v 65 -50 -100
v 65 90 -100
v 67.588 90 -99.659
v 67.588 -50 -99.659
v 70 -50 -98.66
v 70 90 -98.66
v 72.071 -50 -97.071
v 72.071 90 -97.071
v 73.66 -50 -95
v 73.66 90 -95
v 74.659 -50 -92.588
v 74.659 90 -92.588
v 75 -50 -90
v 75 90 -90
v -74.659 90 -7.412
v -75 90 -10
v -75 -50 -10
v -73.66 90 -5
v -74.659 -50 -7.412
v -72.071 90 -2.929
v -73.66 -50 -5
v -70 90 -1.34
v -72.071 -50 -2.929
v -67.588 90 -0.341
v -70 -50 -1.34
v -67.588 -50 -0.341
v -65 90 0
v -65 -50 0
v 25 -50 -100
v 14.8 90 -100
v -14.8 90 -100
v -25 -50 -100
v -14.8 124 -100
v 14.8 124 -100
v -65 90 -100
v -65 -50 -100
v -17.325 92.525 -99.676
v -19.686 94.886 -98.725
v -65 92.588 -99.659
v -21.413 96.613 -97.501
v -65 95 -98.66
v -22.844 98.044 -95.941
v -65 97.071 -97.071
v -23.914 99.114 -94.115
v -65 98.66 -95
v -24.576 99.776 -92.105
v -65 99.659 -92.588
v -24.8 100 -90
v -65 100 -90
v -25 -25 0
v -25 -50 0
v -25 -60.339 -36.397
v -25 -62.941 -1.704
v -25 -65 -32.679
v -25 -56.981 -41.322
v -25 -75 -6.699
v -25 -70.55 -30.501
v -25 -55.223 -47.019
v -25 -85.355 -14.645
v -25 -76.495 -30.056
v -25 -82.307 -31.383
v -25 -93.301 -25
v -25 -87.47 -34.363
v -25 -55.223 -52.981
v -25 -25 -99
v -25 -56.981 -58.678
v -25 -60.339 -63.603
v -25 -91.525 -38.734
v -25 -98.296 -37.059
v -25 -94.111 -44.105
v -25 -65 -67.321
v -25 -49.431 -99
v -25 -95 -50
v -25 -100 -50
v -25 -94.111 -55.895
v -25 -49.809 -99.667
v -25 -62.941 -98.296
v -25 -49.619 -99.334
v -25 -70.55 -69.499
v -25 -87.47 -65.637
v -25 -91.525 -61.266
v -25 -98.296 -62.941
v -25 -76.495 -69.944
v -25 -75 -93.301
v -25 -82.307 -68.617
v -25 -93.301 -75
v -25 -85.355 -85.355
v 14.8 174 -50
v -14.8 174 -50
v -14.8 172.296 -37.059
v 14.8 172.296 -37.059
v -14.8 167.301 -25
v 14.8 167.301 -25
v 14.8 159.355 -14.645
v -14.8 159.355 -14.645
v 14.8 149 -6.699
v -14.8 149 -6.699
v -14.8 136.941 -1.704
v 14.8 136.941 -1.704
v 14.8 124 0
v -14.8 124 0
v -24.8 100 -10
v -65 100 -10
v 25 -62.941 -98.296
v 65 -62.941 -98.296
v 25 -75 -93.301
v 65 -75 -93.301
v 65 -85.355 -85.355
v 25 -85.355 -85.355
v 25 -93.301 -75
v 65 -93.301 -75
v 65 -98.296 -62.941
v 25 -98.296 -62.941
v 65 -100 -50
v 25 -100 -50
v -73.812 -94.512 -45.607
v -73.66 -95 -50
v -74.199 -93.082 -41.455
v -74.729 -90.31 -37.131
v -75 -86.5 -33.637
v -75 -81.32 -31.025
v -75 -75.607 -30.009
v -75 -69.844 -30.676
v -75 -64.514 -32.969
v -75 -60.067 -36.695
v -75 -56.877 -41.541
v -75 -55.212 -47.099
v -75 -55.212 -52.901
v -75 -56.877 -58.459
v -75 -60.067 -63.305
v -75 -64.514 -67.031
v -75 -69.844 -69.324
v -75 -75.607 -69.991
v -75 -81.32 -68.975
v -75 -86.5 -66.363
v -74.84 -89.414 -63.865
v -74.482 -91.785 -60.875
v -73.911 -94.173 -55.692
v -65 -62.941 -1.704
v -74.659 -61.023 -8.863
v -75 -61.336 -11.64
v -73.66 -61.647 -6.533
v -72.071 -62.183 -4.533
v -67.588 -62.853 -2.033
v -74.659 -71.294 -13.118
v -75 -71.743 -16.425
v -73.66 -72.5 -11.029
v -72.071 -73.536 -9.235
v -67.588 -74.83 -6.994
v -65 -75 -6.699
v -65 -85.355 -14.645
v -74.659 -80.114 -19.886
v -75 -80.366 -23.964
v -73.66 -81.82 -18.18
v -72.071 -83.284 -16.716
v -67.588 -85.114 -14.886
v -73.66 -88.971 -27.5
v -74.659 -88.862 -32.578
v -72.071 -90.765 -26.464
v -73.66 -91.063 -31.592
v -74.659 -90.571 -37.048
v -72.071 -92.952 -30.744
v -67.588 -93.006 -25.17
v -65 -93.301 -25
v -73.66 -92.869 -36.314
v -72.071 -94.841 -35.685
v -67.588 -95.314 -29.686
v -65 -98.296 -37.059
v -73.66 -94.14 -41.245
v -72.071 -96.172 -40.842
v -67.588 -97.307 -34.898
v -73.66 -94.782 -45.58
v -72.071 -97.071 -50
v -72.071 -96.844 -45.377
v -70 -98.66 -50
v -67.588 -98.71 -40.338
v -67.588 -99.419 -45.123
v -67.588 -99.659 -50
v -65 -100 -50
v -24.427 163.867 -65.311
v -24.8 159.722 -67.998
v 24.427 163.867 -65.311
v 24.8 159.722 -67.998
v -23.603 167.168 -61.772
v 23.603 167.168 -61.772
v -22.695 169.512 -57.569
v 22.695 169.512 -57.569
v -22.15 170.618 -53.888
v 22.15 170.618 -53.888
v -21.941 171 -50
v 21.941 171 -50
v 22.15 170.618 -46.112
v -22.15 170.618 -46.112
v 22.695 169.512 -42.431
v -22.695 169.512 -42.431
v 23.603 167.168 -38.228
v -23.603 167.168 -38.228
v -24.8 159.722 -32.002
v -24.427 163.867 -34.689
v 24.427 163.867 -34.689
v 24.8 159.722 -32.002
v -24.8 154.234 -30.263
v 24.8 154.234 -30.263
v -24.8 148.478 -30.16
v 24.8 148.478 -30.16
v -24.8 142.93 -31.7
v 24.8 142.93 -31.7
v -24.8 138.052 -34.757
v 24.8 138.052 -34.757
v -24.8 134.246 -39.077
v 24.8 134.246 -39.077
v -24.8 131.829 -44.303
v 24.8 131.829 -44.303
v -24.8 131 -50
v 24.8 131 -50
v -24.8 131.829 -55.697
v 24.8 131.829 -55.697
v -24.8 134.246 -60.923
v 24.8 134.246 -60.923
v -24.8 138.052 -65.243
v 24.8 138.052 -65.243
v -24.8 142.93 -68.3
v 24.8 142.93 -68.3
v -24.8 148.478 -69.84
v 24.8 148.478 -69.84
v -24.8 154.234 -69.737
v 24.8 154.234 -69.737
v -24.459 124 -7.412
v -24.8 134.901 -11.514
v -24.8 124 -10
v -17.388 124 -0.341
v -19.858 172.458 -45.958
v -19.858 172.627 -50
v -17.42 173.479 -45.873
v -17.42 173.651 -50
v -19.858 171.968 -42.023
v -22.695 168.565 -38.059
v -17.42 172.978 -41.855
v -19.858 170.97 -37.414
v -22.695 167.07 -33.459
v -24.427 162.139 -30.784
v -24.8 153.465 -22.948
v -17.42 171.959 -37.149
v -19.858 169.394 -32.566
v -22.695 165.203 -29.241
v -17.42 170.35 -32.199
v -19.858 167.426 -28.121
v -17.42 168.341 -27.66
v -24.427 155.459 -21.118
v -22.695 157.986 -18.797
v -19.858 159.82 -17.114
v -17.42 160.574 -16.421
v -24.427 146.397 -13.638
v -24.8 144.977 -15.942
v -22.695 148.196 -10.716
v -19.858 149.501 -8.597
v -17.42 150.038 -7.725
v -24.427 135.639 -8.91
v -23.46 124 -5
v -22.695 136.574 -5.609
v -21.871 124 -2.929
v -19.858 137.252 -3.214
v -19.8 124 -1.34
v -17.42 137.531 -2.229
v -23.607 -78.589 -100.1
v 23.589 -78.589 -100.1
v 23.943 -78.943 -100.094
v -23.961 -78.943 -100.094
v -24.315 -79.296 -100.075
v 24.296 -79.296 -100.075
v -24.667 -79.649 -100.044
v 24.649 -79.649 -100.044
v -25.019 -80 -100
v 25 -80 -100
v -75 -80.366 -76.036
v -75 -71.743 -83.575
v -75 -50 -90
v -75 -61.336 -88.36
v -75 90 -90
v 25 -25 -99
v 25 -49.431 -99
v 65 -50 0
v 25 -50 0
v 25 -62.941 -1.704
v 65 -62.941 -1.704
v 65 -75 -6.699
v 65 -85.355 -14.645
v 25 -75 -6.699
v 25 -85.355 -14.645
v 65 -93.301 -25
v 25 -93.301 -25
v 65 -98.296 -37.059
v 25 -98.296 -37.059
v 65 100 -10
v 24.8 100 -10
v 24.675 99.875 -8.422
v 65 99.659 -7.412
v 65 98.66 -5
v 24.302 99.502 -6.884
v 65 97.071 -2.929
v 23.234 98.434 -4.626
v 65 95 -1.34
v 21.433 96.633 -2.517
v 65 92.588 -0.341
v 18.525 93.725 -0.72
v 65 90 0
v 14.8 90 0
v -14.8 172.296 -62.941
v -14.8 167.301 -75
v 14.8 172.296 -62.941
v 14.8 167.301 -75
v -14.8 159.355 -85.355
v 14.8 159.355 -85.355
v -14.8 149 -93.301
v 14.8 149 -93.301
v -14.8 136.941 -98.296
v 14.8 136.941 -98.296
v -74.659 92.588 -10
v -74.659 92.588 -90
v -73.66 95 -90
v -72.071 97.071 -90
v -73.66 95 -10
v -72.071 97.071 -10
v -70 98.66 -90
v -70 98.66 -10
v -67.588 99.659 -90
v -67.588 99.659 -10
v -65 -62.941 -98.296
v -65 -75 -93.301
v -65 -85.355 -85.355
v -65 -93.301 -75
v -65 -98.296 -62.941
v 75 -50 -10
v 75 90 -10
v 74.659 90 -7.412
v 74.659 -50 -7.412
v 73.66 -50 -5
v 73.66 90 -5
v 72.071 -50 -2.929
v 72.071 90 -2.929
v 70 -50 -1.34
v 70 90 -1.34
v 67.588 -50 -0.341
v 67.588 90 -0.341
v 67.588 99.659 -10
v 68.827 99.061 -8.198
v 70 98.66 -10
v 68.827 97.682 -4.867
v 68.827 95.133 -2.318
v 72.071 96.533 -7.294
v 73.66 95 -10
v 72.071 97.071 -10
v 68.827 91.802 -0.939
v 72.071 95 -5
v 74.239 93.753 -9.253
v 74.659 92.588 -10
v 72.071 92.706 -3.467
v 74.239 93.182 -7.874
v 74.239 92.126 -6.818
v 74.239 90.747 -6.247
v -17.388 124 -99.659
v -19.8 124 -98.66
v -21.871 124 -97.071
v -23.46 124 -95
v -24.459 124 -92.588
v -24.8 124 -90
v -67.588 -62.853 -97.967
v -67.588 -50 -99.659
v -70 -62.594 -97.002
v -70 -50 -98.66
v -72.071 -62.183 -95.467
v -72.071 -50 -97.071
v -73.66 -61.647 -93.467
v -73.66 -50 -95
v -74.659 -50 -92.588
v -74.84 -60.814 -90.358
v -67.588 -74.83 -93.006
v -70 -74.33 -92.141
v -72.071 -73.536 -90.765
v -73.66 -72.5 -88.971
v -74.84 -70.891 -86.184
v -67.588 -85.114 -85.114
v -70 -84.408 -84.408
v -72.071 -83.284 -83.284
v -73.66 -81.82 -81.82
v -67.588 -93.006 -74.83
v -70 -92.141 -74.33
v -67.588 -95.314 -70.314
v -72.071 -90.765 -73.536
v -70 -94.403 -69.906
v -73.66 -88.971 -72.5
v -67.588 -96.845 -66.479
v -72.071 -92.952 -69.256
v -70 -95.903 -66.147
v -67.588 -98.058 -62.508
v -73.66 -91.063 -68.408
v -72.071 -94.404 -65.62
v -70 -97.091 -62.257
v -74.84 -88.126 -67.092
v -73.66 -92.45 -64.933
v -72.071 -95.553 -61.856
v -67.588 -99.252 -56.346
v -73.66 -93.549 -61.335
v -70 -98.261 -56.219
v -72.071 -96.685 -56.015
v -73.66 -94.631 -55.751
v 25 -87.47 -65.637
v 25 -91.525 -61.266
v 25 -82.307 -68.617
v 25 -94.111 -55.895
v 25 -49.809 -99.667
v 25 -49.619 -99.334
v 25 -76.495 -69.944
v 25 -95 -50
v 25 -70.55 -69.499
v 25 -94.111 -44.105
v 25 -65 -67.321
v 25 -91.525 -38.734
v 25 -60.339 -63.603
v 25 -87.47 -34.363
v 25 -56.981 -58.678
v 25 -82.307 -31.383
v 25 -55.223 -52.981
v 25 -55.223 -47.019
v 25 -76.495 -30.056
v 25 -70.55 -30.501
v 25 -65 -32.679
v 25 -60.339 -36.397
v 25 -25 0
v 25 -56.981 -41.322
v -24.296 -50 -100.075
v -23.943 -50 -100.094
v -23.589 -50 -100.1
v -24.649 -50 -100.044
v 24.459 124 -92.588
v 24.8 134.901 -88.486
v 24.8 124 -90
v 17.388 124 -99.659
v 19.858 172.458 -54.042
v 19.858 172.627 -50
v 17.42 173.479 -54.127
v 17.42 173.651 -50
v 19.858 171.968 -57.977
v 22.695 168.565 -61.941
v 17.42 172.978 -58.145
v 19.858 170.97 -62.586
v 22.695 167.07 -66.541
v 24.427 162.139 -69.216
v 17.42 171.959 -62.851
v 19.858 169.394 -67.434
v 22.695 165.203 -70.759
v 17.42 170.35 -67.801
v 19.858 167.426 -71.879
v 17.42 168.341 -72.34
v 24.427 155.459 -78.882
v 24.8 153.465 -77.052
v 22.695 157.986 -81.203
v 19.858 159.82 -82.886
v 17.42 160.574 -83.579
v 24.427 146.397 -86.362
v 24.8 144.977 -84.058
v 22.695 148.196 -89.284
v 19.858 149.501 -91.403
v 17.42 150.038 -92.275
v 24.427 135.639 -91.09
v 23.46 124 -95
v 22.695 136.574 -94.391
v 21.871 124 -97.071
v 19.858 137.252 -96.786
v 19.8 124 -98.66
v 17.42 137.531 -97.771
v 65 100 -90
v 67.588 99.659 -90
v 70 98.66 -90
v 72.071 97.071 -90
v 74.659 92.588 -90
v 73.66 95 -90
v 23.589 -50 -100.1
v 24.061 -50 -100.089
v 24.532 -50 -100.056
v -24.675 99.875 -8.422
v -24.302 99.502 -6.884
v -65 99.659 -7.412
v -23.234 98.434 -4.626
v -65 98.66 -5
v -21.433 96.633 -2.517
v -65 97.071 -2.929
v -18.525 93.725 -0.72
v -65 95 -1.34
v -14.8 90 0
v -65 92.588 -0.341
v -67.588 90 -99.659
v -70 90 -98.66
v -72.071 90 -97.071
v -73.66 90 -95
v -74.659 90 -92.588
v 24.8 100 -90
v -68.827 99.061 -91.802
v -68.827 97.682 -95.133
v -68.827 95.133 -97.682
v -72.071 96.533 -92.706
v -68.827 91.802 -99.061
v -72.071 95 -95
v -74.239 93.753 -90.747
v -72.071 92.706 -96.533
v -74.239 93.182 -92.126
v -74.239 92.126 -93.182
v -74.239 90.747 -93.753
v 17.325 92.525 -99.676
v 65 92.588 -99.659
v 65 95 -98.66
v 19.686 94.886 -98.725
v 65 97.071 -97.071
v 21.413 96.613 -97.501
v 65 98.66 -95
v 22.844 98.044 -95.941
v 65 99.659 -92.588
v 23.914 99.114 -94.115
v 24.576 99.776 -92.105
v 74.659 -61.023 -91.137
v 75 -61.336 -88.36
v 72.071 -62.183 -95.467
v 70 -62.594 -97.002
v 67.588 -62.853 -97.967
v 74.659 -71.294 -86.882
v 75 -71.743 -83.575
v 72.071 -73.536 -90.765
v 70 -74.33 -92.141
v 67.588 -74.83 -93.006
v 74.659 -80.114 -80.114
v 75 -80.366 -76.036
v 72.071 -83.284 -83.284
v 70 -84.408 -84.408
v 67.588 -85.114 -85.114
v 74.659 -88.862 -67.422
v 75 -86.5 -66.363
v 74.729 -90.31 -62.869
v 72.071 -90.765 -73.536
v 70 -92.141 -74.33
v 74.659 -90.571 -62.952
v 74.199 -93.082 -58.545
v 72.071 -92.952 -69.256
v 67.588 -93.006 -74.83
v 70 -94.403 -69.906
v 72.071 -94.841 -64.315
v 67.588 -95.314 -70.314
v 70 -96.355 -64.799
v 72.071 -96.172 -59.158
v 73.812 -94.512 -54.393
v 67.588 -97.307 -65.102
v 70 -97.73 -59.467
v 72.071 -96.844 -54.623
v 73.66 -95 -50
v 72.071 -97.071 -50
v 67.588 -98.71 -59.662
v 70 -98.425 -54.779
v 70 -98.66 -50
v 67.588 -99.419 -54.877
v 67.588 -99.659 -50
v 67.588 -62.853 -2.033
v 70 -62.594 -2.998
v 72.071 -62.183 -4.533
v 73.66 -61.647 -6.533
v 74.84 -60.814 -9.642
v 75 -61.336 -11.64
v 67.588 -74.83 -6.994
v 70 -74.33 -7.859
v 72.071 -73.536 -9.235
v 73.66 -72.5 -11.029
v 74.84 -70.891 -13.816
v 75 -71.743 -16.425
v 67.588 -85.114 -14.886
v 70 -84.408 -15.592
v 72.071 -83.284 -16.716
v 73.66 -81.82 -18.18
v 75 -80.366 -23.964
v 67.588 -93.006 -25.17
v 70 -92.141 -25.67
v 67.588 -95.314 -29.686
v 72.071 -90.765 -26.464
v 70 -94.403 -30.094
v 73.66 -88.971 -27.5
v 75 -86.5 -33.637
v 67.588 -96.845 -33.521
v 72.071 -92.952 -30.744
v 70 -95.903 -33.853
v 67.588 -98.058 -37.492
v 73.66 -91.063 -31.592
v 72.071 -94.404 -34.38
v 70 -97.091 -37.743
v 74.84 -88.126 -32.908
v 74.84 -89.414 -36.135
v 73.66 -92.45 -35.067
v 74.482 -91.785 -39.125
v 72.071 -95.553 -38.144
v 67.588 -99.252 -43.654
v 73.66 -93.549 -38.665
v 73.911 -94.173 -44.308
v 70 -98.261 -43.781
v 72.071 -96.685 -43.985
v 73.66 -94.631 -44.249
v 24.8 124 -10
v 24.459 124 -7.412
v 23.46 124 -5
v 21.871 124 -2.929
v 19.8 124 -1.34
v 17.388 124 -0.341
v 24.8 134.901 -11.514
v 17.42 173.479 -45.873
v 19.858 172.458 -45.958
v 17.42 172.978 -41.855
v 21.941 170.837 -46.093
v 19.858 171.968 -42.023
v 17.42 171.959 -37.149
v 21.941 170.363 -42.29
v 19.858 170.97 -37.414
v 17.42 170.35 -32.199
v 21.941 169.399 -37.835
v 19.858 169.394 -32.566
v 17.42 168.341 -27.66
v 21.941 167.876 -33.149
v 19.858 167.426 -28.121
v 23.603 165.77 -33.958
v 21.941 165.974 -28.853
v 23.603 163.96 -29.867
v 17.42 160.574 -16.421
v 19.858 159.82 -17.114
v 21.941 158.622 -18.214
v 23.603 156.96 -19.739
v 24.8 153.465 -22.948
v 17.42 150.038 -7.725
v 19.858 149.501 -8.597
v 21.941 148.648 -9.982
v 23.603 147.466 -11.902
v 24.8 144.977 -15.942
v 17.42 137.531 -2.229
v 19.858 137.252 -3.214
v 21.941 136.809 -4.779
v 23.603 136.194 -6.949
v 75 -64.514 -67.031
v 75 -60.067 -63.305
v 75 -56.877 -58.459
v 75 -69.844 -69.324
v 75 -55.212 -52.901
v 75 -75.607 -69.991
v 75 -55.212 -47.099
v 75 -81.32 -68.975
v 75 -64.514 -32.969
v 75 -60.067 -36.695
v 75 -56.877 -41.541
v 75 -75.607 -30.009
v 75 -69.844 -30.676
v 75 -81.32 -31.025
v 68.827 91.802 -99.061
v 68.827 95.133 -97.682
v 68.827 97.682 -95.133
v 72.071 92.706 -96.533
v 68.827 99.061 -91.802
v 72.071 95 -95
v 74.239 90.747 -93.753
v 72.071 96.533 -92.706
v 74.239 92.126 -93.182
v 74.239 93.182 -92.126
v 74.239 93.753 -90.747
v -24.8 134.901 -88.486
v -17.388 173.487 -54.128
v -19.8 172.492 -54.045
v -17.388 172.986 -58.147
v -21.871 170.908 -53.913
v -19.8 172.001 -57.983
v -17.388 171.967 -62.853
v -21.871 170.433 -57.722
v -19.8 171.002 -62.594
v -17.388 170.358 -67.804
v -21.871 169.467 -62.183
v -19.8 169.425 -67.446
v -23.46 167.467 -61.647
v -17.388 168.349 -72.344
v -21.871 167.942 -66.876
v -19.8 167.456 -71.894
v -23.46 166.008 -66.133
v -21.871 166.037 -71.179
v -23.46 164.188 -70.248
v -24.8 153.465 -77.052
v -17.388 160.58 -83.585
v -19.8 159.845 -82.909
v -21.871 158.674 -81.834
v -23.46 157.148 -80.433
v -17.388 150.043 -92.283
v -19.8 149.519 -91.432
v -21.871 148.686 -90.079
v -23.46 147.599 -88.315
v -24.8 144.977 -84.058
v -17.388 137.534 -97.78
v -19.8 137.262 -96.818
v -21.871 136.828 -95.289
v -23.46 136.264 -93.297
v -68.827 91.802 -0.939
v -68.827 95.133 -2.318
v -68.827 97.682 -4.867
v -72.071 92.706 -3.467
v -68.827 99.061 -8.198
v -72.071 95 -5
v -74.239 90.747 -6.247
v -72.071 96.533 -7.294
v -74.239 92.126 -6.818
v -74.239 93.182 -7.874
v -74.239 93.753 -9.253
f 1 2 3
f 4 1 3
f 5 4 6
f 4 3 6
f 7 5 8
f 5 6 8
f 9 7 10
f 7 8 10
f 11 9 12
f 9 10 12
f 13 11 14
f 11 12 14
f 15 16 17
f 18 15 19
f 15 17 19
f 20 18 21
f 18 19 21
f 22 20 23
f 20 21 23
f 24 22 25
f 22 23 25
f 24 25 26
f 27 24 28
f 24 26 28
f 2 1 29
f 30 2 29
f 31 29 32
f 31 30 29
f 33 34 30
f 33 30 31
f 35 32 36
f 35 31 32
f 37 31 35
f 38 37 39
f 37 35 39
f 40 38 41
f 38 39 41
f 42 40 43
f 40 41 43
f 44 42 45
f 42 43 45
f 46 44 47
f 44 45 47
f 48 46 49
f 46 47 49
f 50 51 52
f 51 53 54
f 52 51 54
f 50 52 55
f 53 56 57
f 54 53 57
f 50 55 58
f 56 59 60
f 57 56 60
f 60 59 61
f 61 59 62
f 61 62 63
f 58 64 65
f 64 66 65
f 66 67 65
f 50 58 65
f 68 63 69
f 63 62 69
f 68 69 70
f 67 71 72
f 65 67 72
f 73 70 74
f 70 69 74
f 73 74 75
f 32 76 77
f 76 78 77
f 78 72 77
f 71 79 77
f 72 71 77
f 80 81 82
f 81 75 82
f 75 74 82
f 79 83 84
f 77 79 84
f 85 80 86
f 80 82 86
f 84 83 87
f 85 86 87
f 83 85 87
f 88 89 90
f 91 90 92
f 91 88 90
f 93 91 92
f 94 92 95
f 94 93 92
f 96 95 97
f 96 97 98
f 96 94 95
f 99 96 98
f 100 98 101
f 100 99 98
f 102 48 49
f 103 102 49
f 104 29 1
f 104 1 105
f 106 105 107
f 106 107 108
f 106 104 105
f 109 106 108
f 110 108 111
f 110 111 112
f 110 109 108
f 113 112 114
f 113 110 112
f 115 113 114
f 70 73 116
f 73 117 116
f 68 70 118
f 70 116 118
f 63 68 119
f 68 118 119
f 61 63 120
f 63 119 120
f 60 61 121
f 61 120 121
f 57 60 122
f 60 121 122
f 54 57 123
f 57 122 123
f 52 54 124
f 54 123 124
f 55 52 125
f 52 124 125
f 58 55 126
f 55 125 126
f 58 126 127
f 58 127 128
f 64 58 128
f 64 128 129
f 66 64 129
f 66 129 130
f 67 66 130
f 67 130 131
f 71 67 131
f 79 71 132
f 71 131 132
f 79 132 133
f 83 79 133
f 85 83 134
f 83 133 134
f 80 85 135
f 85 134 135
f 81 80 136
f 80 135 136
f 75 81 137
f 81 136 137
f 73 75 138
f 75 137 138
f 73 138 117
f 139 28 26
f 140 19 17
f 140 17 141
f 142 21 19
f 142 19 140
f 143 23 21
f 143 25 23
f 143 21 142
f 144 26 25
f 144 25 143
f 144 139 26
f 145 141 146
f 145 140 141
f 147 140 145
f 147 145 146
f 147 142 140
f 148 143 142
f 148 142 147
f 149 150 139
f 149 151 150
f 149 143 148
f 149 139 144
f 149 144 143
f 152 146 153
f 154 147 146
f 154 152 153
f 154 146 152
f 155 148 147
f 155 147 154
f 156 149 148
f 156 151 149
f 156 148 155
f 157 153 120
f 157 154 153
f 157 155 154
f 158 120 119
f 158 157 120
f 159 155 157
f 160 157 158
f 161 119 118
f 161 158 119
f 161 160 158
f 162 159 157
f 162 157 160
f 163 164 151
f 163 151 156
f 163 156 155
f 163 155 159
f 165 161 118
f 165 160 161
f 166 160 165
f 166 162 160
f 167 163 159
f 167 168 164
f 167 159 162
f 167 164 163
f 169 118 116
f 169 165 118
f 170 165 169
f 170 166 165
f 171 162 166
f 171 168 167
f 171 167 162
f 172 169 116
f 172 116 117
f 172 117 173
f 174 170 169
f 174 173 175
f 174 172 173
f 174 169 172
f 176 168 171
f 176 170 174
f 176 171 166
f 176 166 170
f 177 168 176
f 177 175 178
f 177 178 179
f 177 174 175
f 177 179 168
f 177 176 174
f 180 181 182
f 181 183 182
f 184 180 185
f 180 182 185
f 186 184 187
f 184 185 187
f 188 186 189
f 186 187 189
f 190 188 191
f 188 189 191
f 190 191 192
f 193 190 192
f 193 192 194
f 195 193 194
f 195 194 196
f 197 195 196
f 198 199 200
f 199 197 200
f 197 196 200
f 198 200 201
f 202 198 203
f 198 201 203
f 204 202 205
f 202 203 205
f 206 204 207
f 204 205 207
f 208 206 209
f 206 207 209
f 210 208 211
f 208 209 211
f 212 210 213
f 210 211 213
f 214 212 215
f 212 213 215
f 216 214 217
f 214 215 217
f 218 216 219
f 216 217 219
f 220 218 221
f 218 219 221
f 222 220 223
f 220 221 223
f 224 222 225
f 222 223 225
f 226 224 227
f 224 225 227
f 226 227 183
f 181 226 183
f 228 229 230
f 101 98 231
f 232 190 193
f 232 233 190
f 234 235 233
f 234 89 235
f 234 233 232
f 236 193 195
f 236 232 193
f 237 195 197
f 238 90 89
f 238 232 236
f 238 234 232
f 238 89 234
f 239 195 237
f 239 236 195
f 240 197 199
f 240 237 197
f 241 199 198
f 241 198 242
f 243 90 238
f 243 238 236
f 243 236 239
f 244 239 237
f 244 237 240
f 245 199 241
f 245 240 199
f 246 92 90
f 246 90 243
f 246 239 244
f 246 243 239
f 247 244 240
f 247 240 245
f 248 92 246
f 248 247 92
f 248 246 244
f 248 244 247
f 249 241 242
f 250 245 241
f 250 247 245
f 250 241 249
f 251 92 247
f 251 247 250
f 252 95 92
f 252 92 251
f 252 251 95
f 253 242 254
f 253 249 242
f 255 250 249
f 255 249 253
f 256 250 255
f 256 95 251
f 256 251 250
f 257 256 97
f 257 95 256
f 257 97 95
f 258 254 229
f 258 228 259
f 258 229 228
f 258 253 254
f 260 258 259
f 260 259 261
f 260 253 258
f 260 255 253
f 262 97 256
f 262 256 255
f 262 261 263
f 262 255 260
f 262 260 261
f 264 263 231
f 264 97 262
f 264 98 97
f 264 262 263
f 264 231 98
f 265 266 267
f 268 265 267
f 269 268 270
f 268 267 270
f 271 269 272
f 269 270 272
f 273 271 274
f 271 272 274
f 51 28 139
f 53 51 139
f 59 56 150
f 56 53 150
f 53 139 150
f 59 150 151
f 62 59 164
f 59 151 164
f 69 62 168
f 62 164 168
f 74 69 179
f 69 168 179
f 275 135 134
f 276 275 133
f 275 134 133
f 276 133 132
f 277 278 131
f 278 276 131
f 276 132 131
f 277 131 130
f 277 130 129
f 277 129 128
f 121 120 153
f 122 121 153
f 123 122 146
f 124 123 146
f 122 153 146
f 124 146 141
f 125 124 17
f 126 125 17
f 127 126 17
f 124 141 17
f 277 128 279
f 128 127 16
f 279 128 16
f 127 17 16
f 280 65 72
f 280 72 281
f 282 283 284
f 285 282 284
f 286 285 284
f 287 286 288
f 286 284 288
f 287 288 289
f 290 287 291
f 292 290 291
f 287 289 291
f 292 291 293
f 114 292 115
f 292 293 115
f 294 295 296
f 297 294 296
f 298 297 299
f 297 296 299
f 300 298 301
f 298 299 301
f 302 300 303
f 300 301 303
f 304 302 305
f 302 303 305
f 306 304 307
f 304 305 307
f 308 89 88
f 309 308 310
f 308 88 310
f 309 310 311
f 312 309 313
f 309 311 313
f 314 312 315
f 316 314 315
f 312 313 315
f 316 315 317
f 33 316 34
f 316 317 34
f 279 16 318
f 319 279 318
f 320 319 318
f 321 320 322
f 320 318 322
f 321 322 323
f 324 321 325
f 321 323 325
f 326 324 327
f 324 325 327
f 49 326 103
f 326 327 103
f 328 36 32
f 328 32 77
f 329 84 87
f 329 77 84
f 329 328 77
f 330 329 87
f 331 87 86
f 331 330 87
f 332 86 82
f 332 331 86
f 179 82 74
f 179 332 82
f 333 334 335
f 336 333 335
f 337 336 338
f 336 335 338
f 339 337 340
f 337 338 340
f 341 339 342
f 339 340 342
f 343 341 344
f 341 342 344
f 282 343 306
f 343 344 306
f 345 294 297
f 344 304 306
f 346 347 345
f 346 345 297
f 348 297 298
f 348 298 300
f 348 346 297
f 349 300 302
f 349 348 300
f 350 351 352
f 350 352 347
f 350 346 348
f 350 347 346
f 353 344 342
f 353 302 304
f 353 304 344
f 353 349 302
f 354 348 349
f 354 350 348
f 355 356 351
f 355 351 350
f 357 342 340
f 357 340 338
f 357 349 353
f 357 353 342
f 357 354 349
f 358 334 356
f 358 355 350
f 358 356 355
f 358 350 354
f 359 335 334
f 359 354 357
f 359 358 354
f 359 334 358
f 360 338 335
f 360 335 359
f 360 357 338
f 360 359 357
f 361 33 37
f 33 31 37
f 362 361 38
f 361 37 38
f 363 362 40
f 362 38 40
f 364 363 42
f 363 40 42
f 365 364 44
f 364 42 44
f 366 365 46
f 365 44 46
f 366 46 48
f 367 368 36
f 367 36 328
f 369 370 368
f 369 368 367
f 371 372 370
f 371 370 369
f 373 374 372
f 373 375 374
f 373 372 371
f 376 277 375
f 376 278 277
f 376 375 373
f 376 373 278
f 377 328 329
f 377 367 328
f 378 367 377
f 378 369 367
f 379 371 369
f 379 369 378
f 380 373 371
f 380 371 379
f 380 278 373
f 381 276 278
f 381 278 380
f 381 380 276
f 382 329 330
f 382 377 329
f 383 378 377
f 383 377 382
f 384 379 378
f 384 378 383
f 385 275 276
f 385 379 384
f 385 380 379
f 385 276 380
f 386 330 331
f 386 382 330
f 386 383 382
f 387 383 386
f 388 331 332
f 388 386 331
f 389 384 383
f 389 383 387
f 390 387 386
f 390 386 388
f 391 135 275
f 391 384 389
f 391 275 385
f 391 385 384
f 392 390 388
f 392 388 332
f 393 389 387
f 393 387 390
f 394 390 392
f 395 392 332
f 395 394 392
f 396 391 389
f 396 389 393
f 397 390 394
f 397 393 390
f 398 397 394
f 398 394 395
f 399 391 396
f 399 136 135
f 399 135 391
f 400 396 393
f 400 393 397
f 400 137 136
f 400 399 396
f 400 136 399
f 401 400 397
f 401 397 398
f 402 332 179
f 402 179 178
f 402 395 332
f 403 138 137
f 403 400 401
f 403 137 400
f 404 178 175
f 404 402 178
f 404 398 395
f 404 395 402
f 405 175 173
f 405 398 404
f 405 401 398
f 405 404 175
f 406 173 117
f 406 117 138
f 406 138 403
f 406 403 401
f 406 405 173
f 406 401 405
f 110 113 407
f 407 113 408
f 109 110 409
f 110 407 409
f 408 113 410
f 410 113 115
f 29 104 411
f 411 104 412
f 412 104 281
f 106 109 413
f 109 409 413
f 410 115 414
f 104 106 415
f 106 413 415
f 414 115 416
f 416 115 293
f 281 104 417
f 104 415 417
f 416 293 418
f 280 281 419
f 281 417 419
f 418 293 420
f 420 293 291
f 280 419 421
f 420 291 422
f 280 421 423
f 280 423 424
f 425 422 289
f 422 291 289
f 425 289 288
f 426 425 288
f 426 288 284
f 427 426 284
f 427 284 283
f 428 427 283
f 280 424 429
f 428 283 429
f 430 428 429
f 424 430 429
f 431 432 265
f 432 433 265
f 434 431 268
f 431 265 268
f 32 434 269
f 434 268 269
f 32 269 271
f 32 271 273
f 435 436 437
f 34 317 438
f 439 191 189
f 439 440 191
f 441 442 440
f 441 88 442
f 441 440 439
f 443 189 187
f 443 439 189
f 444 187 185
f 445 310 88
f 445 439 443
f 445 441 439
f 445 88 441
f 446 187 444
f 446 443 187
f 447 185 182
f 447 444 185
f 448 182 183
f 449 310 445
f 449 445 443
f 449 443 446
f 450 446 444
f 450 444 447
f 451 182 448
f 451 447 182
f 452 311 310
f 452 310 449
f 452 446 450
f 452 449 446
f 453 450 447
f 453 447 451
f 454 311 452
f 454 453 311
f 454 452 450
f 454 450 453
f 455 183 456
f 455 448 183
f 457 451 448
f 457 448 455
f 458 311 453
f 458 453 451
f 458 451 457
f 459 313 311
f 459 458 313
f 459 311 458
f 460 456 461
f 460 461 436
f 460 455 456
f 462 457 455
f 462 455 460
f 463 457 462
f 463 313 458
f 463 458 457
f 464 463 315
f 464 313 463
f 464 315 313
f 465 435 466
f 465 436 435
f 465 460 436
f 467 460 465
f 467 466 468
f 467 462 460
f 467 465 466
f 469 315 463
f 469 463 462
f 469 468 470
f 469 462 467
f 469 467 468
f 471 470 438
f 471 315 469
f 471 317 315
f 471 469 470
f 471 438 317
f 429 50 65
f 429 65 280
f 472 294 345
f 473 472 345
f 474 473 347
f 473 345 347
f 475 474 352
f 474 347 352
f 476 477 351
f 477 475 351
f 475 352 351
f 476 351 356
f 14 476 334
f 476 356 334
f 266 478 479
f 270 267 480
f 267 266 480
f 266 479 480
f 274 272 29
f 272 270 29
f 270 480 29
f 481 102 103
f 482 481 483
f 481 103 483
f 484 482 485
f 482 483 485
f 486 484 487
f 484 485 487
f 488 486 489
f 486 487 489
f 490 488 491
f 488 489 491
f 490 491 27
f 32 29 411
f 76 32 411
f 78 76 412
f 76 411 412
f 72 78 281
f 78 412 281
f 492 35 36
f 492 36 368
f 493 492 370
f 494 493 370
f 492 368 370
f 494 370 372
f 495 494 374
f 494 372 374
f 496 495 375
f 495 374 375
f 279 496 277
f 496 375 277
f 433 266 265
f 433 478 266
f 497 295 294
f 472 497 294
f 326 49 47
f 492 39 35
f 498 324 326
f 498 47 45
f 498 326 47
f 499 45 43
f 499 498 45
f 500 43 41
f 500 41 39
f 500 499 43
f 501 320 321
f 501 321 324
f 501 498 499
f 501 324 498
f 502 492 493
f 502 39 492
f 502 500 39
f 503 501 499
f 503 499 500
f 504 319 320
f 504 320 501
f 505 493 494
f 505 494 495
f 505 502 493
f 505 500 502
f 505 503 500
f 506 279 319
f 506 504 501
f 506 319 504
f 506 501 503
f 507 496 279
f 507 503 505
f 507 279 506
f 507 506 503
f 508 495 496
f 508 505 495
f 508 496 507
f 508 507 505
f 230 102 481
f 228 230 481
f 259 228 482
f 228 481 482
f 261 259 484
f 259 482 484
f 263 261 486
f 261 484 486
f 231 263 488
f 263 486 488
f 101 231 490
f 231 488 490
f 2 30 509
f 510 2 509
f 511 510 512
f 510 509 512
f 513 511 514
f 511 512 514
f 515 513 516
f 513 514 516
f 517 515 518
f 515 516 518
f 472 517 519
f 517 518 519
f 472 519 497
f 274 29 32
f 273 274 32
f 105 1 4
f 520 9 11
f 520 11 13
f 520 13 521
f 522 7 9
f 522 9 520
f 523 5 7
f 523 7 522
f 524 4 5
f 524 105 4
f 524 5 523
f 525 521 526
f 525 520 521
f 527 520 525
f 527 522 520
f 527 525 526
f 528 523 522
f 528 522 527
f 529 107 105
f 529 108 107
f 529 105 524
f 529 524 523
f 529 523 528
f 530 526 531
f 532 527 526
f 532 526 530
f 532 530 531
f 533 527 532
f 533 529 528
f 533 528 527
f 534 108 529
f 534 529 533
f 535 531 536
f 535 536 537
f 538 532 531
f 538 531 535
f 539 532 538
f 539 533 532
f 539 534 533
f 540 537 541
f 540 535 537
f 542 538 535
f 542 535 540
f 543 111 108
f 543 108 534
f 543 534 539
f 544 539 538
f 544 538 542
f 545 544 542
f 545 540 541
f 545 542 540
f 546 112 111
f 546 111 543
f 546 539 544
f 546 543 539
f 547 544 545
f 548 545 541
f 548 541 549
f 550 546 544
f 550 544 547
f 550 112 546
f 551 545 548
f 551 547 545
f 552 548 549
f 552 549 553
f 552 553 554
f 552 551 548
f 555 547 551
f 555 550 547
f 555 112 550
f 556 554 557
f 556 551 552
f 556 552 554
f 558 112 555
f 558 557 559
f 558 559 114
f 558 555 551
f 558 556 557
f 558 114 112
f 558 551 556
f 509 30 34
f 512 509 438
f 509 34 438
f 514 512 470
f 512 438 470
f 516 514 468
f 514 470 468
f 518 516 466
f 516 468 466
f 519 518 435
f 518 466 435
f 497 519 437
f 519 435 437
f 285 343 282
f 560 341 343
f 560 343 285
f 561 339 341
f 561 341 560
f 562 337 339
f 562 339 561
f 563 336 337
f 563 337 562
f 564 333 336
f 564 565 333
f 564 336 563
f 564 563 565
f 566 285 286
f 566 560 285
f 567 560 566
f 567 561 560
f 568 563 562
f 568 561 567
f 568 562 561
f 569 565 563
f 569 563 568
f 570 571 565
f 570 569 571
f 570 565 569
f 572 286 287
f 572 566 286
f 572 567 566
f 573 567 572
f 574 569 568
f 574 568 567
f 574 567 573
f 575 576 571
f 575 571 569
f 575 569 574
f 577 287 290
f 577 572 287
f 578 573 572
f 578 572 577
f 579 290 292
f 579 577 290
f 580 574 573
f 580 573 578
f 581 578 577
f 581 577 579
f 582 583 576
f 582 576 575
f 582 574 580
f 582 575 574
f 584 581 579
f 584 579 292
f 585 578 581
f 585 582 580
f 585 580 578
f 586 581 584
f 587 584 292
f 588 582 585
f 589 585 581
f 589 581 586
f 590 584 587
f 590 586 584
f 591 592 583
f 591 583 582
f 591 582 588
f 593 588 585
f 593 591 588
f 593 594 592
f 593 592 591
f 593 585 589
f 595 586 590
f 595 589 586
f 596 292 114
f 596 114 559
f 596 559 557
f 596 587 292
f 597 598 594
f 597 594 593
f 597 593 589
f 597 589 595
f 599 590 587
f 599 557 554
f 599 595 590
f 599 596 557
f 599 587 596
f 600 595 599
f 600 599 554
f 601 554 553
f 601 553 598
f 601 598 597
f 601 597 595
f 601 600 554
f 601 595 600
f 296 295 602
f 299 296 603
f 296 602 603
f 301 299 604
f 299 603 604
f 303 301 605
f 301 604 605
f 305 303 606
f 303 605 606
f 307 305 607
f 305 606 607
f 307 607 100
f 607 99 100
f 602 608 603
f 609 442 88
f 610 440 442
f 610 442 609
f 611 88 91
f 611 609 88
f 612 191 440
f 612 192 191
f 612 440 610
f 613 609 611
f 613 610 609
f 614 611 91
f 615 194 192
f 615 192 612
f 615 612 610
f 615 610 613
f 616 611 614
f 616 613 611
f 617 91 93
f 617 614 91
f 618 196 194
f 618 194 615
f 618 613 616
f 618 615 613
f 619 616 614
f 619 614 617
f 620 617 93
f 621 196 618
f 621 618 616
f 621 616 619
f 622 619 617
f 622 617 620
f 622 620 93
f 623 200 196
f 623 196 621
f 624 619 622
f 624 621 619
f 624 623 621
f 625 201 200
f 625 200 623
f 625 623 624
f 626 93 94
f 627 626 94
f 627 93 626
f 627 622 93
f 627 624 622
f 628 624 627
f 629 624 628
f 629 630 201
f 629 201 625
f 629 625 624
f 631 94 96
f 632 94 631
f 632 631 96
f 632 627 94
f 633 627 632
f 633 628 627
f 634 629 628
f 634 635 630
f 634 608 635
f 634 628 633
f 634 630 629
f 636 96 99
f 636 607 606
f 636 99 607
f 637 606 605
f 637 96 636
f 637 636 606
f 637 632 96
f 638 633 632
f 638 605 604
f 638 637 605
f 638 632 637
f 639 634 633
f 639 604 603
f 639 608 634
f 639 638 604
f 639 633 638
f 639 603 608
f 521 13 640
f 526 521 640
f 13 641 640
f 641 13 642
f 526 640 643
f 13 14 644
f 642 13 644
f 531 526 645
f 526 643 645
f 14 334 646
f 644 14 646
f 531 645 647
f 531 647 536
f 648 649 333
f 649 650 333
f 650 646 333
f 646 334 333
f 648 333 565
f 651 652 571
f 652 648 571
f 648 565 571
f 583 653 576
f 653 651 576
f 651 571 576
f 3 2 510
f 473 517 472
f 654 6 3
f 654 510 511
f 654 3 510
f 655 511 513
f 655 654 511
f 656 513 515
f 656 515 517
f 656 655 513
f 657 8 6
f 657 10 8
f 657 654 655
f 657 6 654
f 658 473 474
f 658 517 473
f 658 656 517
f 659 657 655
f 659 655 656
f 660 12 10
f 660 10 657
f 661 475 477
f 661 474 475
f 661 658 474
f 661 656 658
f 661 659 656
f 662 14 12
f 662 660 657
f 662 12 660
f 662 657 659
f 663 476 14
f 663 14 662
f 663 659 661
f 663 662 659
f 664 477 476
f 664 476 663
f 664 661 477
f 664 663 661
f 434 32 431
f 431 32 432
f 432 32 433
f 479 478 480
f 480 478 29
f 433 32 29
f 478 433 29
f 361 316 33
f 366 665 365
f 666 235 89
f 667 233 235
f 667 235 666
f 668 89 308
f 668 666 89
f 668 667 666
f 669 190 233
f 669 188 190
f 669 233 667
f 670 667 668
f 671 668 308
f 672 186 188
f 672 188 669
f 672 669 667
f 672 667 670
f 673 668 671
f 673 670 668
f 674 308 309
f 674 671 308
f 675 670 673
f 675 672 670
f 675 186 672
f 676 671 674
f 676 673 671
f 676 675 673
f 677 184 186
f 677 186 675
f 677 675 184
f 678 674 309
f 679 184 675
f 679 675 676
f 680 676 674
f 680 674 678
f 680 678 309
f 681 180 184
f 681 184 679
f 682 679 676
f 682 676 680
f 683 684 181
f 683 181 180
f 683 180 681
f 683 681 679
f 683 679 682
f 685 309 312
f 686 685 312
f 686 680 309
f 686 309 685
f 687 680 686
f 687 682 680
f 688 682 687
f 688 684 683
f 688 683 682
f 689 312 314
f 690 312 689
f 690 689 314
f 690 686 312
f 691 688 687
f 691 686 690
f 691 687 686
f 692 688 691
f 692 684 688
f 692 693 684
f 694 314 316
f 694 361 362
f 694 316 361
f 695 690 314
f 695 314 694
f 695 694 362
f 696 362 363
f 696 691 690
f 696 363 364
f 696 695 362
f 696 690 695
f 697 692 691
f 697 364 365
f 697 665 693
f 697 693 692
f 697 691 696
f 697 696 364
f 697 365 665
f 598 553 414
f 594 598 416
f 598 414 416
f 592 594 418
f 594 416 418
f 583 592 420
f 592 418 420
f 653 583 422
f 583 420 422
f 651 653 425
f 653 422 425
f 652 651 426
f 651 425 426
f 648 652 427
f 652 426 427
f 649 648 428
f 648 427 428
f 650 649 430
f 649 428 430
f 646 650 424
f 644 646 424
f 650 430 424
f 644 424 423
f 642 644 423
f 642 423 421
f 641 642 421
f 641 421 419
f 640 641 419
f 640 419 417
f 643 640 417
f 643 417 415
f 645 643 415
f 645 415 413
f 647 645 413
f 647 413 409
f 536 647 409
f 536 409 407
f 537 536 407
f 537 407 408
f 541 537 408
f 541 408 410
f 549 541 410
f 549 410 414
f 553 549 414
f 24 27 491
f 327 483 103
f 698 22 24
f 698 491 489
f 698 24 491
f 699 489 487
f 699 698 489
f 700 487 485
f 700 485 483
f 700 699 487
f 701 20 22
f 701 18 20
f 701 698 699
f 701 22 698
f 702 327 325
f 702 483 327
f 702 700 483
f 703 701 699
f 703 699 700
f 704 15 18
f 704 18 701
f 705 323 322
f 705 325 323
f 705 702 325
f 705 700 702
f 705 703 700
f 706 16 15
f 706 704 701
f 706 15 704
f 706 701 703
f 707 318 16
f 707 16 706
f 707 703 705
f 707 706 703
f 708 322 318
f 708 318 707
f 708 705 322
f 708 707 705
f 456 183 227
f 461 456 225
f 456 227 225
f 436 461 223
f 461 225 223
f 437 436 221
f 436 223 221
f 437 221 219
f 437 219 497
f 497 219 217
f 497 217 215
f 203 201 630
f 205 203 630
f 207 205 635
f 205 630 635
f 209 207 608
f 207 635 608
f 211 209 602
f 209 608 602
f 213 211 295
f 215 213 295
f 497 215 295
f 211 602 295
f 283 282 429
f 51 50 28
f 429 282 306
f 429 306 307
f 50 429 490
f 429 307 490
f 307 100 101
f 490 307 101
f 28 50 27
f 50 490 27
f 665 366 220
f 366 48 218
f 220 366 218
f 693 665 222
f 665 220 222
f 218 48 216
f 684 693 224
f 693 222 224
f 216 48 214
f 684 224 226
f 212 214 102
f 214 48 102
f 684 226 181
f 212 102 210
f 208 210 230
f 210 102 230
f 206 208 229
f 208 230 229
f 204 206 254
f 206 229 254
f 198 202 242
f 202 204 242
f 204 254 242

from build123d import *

# Parameters (mm, degrees)
BOSS_EXTRUDE1_DEPTH    = 100
SKETCH2_W              = 50
SKETCH2_H              = 50
CUT_EXTRUDE1_DEPTH     = 215.245186644
FILLET1_R              = 50
CUT_EXTRUDE2_DEPTH     = 25
SKETCH7_R              = 20
CUT_EXTRUDE3_DEPTH     = 251.551391934
FILLET2_R              = 50
CUT_EXTRUDE6_START     = -100
CUT_EXTRUDE6_OUTLINE_W = 50
CUT_EXTRUDE6_OUTLINE_H = 6.698729811
CUT_EXTRUDE6_DEPTH     = 50
CUT_EXTRUDE7_DEPTH     = 25
FILLET3_R              = 10
SKETCH11_W             = 50
SKETCH11_H             = 25
CUT_EXTRUDE8_DEPTH     = 99
BOSS_EXTRUDE7_DEPTH    = 0.1
FILLET4_R              = 10
FILLET5_R              = 10
SKETCH14_R             = 20
CUT_EXTRUDE9_DEPTH     = 225.178611948


with BuildPart() as part:
    # Sketch1 → Boss-Extrude1 (new body)
    with BuildSketch(Plane.XY):
        Polygon((-24.8, 100), (-24.8, 174), (24.8, 174), (24.8, 100), (75, 100), (75, -100), (-75, -100), (-75, 100), align=None)
    extrude(amount=-BOSS_EXTRUDE1_DEPTH)

    # Sketch2 → Cut-Extrude1 (cut, through all)
    with BuildSketch(Plane.XY):
        with Locations((0, -100)):
            Rectangle(SKETCH2_W, SKETCH2_H)
    extrude(amount=-CUT_EXTRUDE1_DEPTH, mode=Mode.SUBTRACT)

    # Fillet1
    fillet1_edges = [part.edges().sort_by_distance(p)[0] for p in [
        (0, 174, -100),
        (0, 174, 0),
    ]]
    fillet(fillet1_edges, radius=FILLET1_R - 0.0001)  # a hair under: the kernel refuses the full size

    # Sketch6 → Cut-Extrude2 (cut, symmetric)
    with BuildSketch(Plane(origin=(0, 0, 0), x_dir=(0, 0, -1), z_dir=(1, 0, 0))):
        with BuildLine():
            Line((100, -75), (0, -75))
            ThreePointArc((0, -75), (50, -25), (100, -75))
        make_face()
    extrude(amount=CUT_EXTRUDE2_DEPTH, both=True, mode=Mode.SUBTRACT)

    # Sketch7 → Cut-Extrude3 (cut, through all)
    with BuildSketch(Plane.ZY.offset(75)):
        with Locations(Location((-50, -75, 0), (0, 0, 270))):
            Circle(SKETCH7_R)
    extrude(amount=-CUT_EXTRUDE3_DEPTH, mode=Mode.SUBTRACT)

    # Fillet2
    fillet2_edges = [part.edges().sort_by_distance(p)[0] for p in [
        (-50, -100, -100),
        (-50, -100, 0),
    ]]
    fillet(fillet2_edges, radius=FILLET2_R - 0.0001)  # a hair under: the kernel refuses the full size

    # Cut-Extrude6: read off the stored shape, not the designer's step
    # Cut-Extrude6 outline → Cut-Extrude6 (cut)
    with BuildSketch(Plane(origin=(0, 0, 0), x_dir=(1, 0, 0), z_dir=(0, 1, 0)).offset(CUT_EXTRUDE6_START)):
        with Locations((0, 96.650635095)):
            Rectangle(CUT_EXTRUDE6_OUTLINE_W, CUT_EXTRUDE6_OUTLINE_H)
        with Locations((0, 3.349364906)):
            Rectangle(CUT_EXTRUDE6_OUTLINE_W, CUT_EXTRUDE6_OUTLINE_H)
    extrude(amount=CUT_EXTRUDE6_DEPTH, mode=Mode.SUBTRACT)

    # Sketch10 → Cut-Extrude7 (cut, symmetric)
    with BuildSketch(Plane(origin=(0, 0, 0), x_dir=(0, 0, -1), z_dir=(1, 0, 0))):
        with BuildLine():
            Line((0, -50), (100, -50))
            ThreePointArc((100, -50), (50, -36.611517322), (0, -50))
        make_face()
    extrude(amount=CUT_EXTRUDE7_DEPTH, both=True, mode=Mode.SUBTRACT)

    # Fillet3
    # the kernel refuses this fillet: 10 mm, written as the material it takes off along each edge
    with BuildSketch(Plane(origin=(24.8, 124.0001, -100), x_dir=(0, 0, 1), z_dir=(0, -1, 0)), Plane(origin=(-24.8, 100, 0), x_dir=(1, 0, 0), z_dir=(0, 1, 0)), Plane(origin=(-24.8, 100, -100), x_dir=(0, 0, 1), z_dir=(0, 1, 0)), Plane(origin=(24.8, 124.0001, 0), x_dir=(-1, 0, 0), z_dir=(0, -1, 0))) as fillet3_piece_1:
        with BuildLine():
            CenterArc((FILLET3_R, FILLET3_R), FILLET3_R, 180, 90)
            Line((0, FILLET3_R), (0, 0))
            Line((0, 0), (FILLET3_R, 0))
        make_face()
    extrude(amount=24.0001, mode=Mode.SUBTRACT)
    with BuildSketch(Plane(origin=(24.8, 100, 0), x_dir=(0, -1, 0), z_dir=(1, 0, 0)), Plane(origin=(-100, 100, -100), x_dir=(0, 0, 1), z_dir=(1, 0, 0)), Plane(origin=(24.8, 100, -100), x_dir=(0, 0, 1), z_dir=(1, 0, 0)), Plane(origin=(-100, 100, 0), x_dir=(0, -1, 0), z_dir=(1, 0, 0))) as fillet3_piece_2:
        with BuildLine():
            CenterArc((FILLET3_R, FILLET3_R), FILLET3_R, 180, 90)
            Line((0, FILLET3_R), (0, 0))
            Line((0, 0), (FILLET3_R, 0))
        make_face()
    extrude(amount=75.2, mode=Mode.SUBTRACT)
    with BuildSketch(Plane(origin=(-75, -50.0001, -100), x_dir=(0, 0, 1), z_dir=(0, 1, 0)), Plane(origin=(75, 125, 0), x_dir=(-1, 0, 0), z_dir=(0, -1, 0)), Plane(origin=(75, 125, -100), x_dir=(0, 0, 1), z_dir=(0, -1, 0)), Plane(origin=(-75, -50.0001, 0), x_dir=(1, 0, 0), z_dir=(0, 1, 0))) as fillet3_piece_3:
        with BuildLine():
            CenterArc((FILLET3_R, FILLET3_R), FILLET3_R, 180, 90)
            Line((0, FILLET3_R), (0, 0))
            Line((0, 0), (FILLET3_R, 0))
        make_face()
    extrude(amount=175.0001, mode=Mode.SUBTRACT)
    with BuildSketch(Plane(origin=(-24.8, 124.0001, -49.9999), x_dir=(0, 1, 0), z_dir=(0, 0, -1))) as fillet3_piece_4:
        with BuildLine():
            CenterArc((49.9999 - FILLET3_R, FILLET3_R), FILLET3_R, 270, 90)
            Line((49.9999 - FILLET3_R, 0), (49.9999, 0))
            Line((49.9999, 0), (49.9999, FILLET3_R))
        make_face()
    revolve(axis=Axis((-24.8, 124.0001, -49.9999), (1, 0, 0)), revolution_arc=90, mode=Mode.SUBTRACT)
    with BuildSketch(Plane(origin=(-24.8, 124.0001, -50.0001), x_dir=(0, 1, 0), z_dir=(0, 0, 1))) as fillet3_piece_5:
        with BuildLine():
            CenterArc((49.9999 - FILLET3_R, -FILLET3_R), FILLET3_R, 0, 90)
            Line((49.9999, -FILLET3_R), (49.9999, 0))
            Line((49.9999, 0), (49.9999 - FILLET3_R, 0))
        make_face()
    revolve(axis=Axis((-24.8, 124.0001, -50.0001), (-1, 0, 0)), revolution_arc=90, mode=Mode.SUBTRACT)
    with BuildSketch(Plane(origin=(24.8, 124.0001, -49.9999), x_dir=(0, 1, 0), z_dir=(0, 0, -1))) as fillet3_piece_6:
        with BuildLine():
            CenterArc((49.9999 - FILLET3_R, -FILLET3_R), FILLET3_R, 0, 90)
            Line((49.9999, -FILLET3_R), (49.9999, 0))
            Line((49.9999, 0), (49.9999 - FILLET3_R, 0))
        make_face()
    revolve(axis=Axis((24.8, 124.0001, -49.9999), (1, 0, 0)), revolution_arc=90, mode=Mode.SUBTRACT)
    with BuildSketch(Plane(origin=(24.8, 124.0001, -50.0001), x_dir=(0, 1, 0), z_dir=(0, 0, 1))) as fillet3_piece_7:
        with BuildLine():
            CenterArc((49.9999 - FILLET3_R, FILLET3_R), FILLET3_R, 270, 90)
            Line((49.9999, FILLET3_R), (49.9999, 0))
            Line((49.9999, 0), (49.9999 - FILLET3_R, 0))
        make_face()
    revolve(axis=Axis((24.8, 124.0001, -50.0001), (-1, 0, 0)), revolution_arc=90, mode=Mode.SUBTRACT)
    with BuildSketch(Plane(origin=(75, -50.0001, -49.9999), x_dir=(0, 0, 1), z_dir=(0, 1, 0))) as fillet3_piece_8:
        with BuildLine():
            CenterArc((49.9999 - FILLET3_R, -FILLET3_R), FILLET3_R, 0, 90)
            Line((49.9999, -FILLET3_R), (49.9999, 0))
            Line((49.9999, 0), (49.9999 - FILLET3_R, 0))
        make_face()
    revolve(axis=Axis((75, -50.0001, -49.9999), (1, 0, 0)), revolution_arc=90, mode=Mode.SUBTRACT)
    with BuildSketch(Plane(origin=(75, -50.0001, -50.0001), x_dir=(0, 0, -1), z_dir=(0, 1, 0))) as fillet3_piece_9:
        with BuildLine():
            CenterArc((49.9999 - FILLET3_R, FILLET3_R), FILLET3_R, 270, 90)
            Line((49.9999, FILLET3_R), (49.9999, 0))
            Line((49.9999, 0), (49.9999 - FILLET3_R, 0))
        make_face()
    revolve(axis=Axis((75, -50.0001, -50.0001), (-1, 0, 0)), revolution_arc=90, mode=Mode.SUBTRACT)
    with BuildSketch(Plane(origin=(-75, -50.0001, -49.9999), x_dir=(0, 0, 1), z_dir=(0, 1, 0))) as fillet3_piece_10:
        with BuildLine():
            CenterArc((49.9999 - FILLET3_R, FILLET3_R), FILLET3_R, 270, 90)
            Line((49.9999, FILLET3_R), (49.9999, 0))
            Line((49.9999, 0), (49.9999 - FILLET3_R, 0))
        make_face()
    revolve(axis=Axis((-75, -50.0001, -49.9999), (1, 0, 0)), revolution_arc=90, mode=Mode.SUBTRACT)
    with BuildSketch(Plane(origin=(-75, -50.0001, -50.0001), x_dir=(0, 0, -1), z_dir=(0, 1, 0))) as fillet3_piece_11:
        with BuildLine():
            CenterArc((49.9999 - FILLET3_R, -FILLET3_R), FILLET3_R, 0, 90)
            Line((49.9999, -FILLET3_R), (49.9999, 0))
            Line((49.9999, 0), (49.9999 - FILLET3_R, 0))
        make_face()
    revolve(axis=Axis((-75, -50.0001, -50.0001), (-1, 0, 0)), revolution_arc=90, mode=Mode.SUBTRACT)
    with BuildSketch(Plane(origin=(-75, -100, -49.9999), x_dir=(0, 1, 0), z_dir=(0, 0, -1)), Plane(origin=(24.8, 174, -49.9999), x_dir=(0, -1, 0), z_dir=(0, 0, -1))) as fillet3_piece_12:
        with BuildLine():
            CenterArc((FILLET3_R, FILLET3_R), FILLET3_R, 180, 90)
            Line((0, FILLET3_R), (0, 0))
            Line((0, 0), (FILLET3_R, 0))
        make_face()
    extrude(amount=0.0002, mode=Mode.SUBTRACT)
    with BuildSketch(Plane(origin=(75, -100, -49.9999), x_dir=(0, 1, 0), z_dir=(0, 0, -1)), Plane(origin=(-24.8, 174, -49.9999), x_dir=(0, -1, 0), z_dir=(0, 0, -1))) as fillet3_piece_13:
        with BuildLine():
            CenterArc((FILLET3_R, -FILLET3_R), FILLET3_R, 90, 90)
            Line((0, -FILLET3_R), (0, 0))
            Line((0, 0), (FILLET3_R, 0))
        make_face()
    extrude(amount=0.0002, mode=Mode.SUBTRACT)
    with BuildSketch(Plane(origin=(-0.2, 100, -100), x_dir=(0, 0, 1), z_dir=(1, 0, 0))) as fillet3_piece_14a_section:
        with BuildLine():
            CenterArc((FILLET3_R, FILLET3_R), FILLET3_R, 180, 90)
            Line((0, FILLET3_R), (0, 0))
            Line((0, 0), (FILLET3_R, 0))
        make_face()
    fillet3_piece_14a = extrude(amount=100.2, mode=Mode.PRIVATE)
    fillet3_piece_14a = split(fillet3_piece_14a, bisect_by=Plane(origin=(24.8, 100, -100), z_dir=(-1, 0, 0)), keep=Keep.TOP, mode=Mode.PRIVATE)
    with BuildSketch(Plane(origin=(24.8, 124.0001, -100), x_dir=(0, 0, 1), z_dir=(0, -1, 0))) as fillet3_piece_14b_section:
        with BuildLine():
            CenterArc((FILLET3_R, FILLET3_R), FILLET3_R, 180, 90)
            Line((0, FILLET3_R), (0, 0))
            Line((0, 0), (FILLET3_R, 0))
        make_face()
    fillet3_piece_14b = extrude(amount=49.0001, mode=Mode.PRIVATE)
    fillet3_piece_14b = split(fillet3_piece_14b, bisect_by=Plane(origin=(24.8, 100, -100), z_dir=(0, -1, 0)), keep=Keep.TOP, mode=Mode.PRIVATE)
    fillet3_piece_14 = fillet3_piece_14a & fillet3_piece_14b
    add(fillet3_piece_14, mode=Mode.SUBTRACT)
    with BuildSketch(Plane(origin=(-0.2, 100, 0), x_dir=(0, -1, 0), z_dir=(1, 0, 0))) as fillet3_piece_15a_section:
        with BuildLine():
            CenterArc((FILLET3_R, FILLET3_R), FILLET3_R, 180, 90)
            Line((0, FILLET3_R), (0, 0))
            Line((0, 0), (FILLET3_R, 0))
        make_face()
    fillet3_piece_15a = extrude(amount=100.2, mode=Mode.PRIVATE)
    fillet3_piece_15a = split(fillet3_piece_15a, bisect_by=Plane(origin=(24.8, 100, 0), z_dir=(-1, 0, 0)), keep=Keep.TOP, mode=Mode.PRIVATE)
    with BuildSketch(Plane(origin=(24.8, 124.0001, 0), x_dir=(-1, 0, 0), z_dir=(0, -1, 0))) as fillet3_piece_15b_section:
        with BuildLine():
            CenterArc((FILLET3_R, FILLET3_R), FILLET3_R, 180, 90)
            Line((0, FILLET3_R), (0, 0))
            Line((0, 0), (FILLET3_R, 0))
        make_face()
    fillet3_piece_15b = extrude(amount=49.0001, mode=Mode.PRIVATE)
    fillet3_piece_15b = split(fillet3_piece_15b, bisect_by=Plane(origin=(24.8, 100, 0), z_dir=(0, -1, 0)), keep=Keep.TOP, mode=Mode.PRIVATE)
    fillet3_piece_15 = fillet3_piece_15a & fillet3_piece_15b
    add(fillet3_piece_15, mode=Mode.SUBTRACT)
    with BuildSketch(Plane(origin=(-24.8, 75, -100), x_dir=(0, 0, 1), z_dir=(0, 1, 0))) as fillet3_piece_16a_section:
        with BuildLine():
            CenterArc((FILLET3_R, FILLET3_R), FILLET3_R, 180, 90)
            Line((0, FILLET3_R), (0, 0))
            Line((0, 0), (FILLET3_R, 0))
        make_face()
    fillet3_piece_16a = extrude(amount=49.0001, mode=Mode.PRIVATE)
    fillet3_piece_16a = split(fillet3_piece_16a, bisect_by=Plane(origin=(-24.8, 100, -100), z_dir=(0, -1, 0)), keep=Keep.TOP, mode=Mode.PRIVATE)
    with BuildSketch(Plane(origin=(-100, 100, -100), x_dir=(0, 0, 1), z_dir=(1, 0, 0))) as fillet3_piece_16b_section:
        with BuildLine():
            CenterArc((FILLET3_R, FILLET3_R), FILLET3_R, 180, 90)
            Line((0, FILLET3_R), (0, 0))
            Line((0, 0), (FILLET3_R, 0))
        make_face()
    fillet3_piece_16b = extrude(amount=100.2, mode=Mode.PRIVATE)
    fillet3_piece_16b = split(fillet3_piece_16b, bisect_by=Plane(origin=(-24.8, 100, -100), z_dir=(1, 0, 0)), keep=Keep.TOP, mode=Mode.PRIVATE)
    fillet3_piece_16 = fillet3_piece_16a & fillet3_piece_16b
    add(fillet3_piece_16, mode=Mode.SUBTRACT)
    with BuildSketch(Plane(origin=(-24.8, 75, 0), x_dir=(1, 0, 0), z_dir=(0, 1, 0))) as fillet3_piece_17a_section:
        with BuildLine():
            CenterArc((FILLET3_R, FILLET3_R), FILLET3_R, 180, 90)
            Line((0, FILLET3_R), (0, 0))
            Line((0, 0), (FILLET3_R, 0))
        make_face()
    fillet3_piece_17a = extrude(amount=49.0001, mode=Mode.PRIVATE)
    fillet3_piece_17a = split(fillet3_piece_17a, bisect_by=Plane(origin=(-24.8, 100, 0), z_dir=(0, -1, 0)), keep=Keep.TOP, mode=Mode.PRIVATE)
    with BuildSketch(Plane(origin=(-100, 100, 0), x_dir=(0, -1, 0), z_dir=(1, 0, 0))) as fillet3_piece_17b_section:
        with BuildLine():
            CenterArc((FILLET3_R, FILLET3_R), FILLET3_R, 180, 90)
            Line((0, FILLET3_R), (0, 0))
            Line((0, 0), (FILLET3_R, 0))
        make_face()
    fillet3_piece_17b = extrude(amount=100.2, mode=Mode.PRIVATE)
    fillet3_piece_17b = split(fillet3_piece_17b, bisect_by=Plane(origin=(-24.8, 100, 0), z_dir=(1, 0, 0)), keep=Keep.TOP, mode=Mode.PRIVATE)
    fillet3_piece_17 = fillet3_piece_17a & fillet3_piece_17b
    add(fillet3_piece_17, mode=Mode.SUBTRACT)

    # Sketch11 → Cut-Extrude8 (cut)
    with BuildSketch(Plane.XY):
        with Locations((0, -37.5)):
            Rectangle(SKETCH11_W, SKETCH11_H)
    extrude(amount=-CUT_EXTRUDE8_DEPTH, mode=Mode.SUBTRACT)

    # Fillet5
    # the kernel refuses this fillet: 10 mm, written as the material it takes off along each edge
    with BuildSketch(Plane(origin=(65, 90, -10), x_dir=(0, 1, 0), z_dir=(1, 0, 0))) as fillet5_piece_1_section:
        Polygon((0, 0), (FILLET5_R, 0), (FILLET5_R, FILLET5_R), (0, FILLET5_R), align=None)
    fillet5_piece_1 = extrude(amount=FILLET5_R, mode=Mode.PRIVATE)
    fillet5_piece_1 = fillet5_piece_1 - Plane(origin=(65, 90, -10), x_dir=(0, -0.7071067811865475, -0.7071067811865475), z_dir=(1, 0, 0)) * Sphere(FILLET5_R, mode=Mode.PRIVATE)
    add(fillet5_piece_1, mode=Mode.SUBTRACT)
    with BuildSketch(Plane(origin=(65, 90, -90), x_dir=(0, 1, 0), z_dir=(1, 0, 0))) as fillet5_piece_2_section:
        Polygon((0, 0), (FILLET5_R, 0), (FILLET5_R, -FILLET5_R), (0, -FILLET5_R), align=None)
    fillet5_piece_2 = extrude(amount=FILLET5_R, mode=Mode.PRIVATE)
    fillet5_piece_2 = fillet5_piece_2 - Plane(origin=(65, 90, -90), x_dir=(0, -0.7071067811865475, 0.7071067811865475), z_dir=(1, 0, 0)) * Sphere(FILLET5_R, mode=Mode.PRIVATE)
    add(fillet5_piece_2, mode=Mode.SUBTRACT)
    with BuildSketch(Plane(origin=(-65, 90, -90), x_dir=(0, 1, 0), z_dir=(-1, 0, 0))) as fillet5_piece_3_section:
        Polygon((0, 0), (FILLET5_R, 0), (FILLET5_R, FILLET5_R), (0, FILLET5_R), align=None)
    fillet5_piece_3 = extrude(amount=FILLET5_R, mode=Mode.PRIVATE)
    fillet5_piece_3 = fillet5_piece_3 - Plane(origin=(-65, 90, -90), x_dir=(0, -0.7071067811865475, 0.7071067811865475), z_dir=(-1, 0, 0)) * Sphere(FILLET5_R, mode=Mode.PRIVATE)
    add(fillet5_piece_3, mode=Mode.SUBTRACT)
    with BuildSketch(Plane(origin=(-65, 90, -10), x_dir=(0, 1, 0), z_dir=(-1, 0, 0))) as fillet5_piece_4_section:
        Polygon((0, 0), (FILLET5_R, 0), (FILLET5_R, -FILLET5_R), (0, -FILLET5_R), align=None)
    fillet5_piece_4 = extrude(amount=FILLET5_R, mode=Mode.PRIVATE)
    fillet5_piece_4 = fillet5_piece_4 - Plane(origin=(-65, 90, -10), x_dir=(0, -0.7071067811865475, -0.7071067811865475), z_dir=(-1, 0, 0)) * Sphere(FILLET5_R, mode=Mode.PRIVATE)
    add(fillet5_piece_4, mode=Mode.SUBTRACT)
    with BuildSketch(Plane(origin=(75, 100, -10), x_dir=(0, -1, 0), z_dir=(0, 0, -1))) as fillet5_piece_5:
        with BuildLine():
            CenterArc((FILLET5_R, FILLET5_R), FILLET5_R, 180, 90)
            Line((0, FILLET5_R), (0, 0))
            Line((0, 0), (FILLET5_R, 0))
        make_face()
    extrude(amount=80, mode=Mode.SUBTRACT)
    with BuildSketch(Plane(origin=(-75, 100, -10), x_dir=(0, -1, 0), z_dir=(0, 0, -1))) as fillet5_piece_6:
        with BuildLine():
            CenterArc((FILLET5_R, -FILLET5_R), FILLET5_R, 90, 90)
            Line((0, -FILLET5_R), (0, 0))
            Line((0, 0), (FILLET5_R, 0))
        make_face()
    extrude(amount=80, mode=Mode.SUBTRACT)

    # Sketch14 → Cut-Extrude9 (cut, through all)
    with BuildSketch(Plane(origin=(24.8, 0, 0), x_dir=(0, 0, -1), z_dir=(1, 0, 0))):
        with Locations(Location((50, 151, 0), (0, 0, 25.856016698))):
            Circle(SKETCH14_R)
    extrude(amount=-CUT_EXTRUDE9_DEPTH, mode=Mode.SUBTRACT)


with BuildPart() as body_2:
    # Sketch13 → Boss-Extrude7 (new body)
    with BuildSketch(Plane(origin=(0, 0, -100), x_dir=(-1, 0, 0), z_dir=(0, 0, -1))):
        Polygon((-25, -50), (-25, -80), (25.018802851, -80), (25, -50), align=None)
    extrude(amount=BOSS_EXTRUDE7_DEPTH)

    # Fillet4
    # the kernel refuses this fillet: 10 mm, written as the material it takes off along each edge
    with BuildSketch(Plane(origin=(-25.021013242, -83.526683302, -100.1), x_dir=(0, 0, 1), z_dir=(0.0006267615930631998, 0.9999998035849335, 0))) as fillet4_piece_1:
        with BuildLine():
            CenterArc((10, 1.410673598), FILLET4_R, 180, 8.109614456)
            Line((0, 1.410673598), (0, 0))
            Line((0, 0), (0.1, 0))
        make_face()
    extrude(amount=37.053373882, mode=Mode.SUBTRACT)
    with BuildSketch(Plane(origin=(25, -46.473316005, -100.1), x_dir=(0, 0, 1), z_dir=(0, -1, 0))) as fillet4_piece_2:
        with BuildLine():
            CenterArc((10, 1.410673598), FILLET4_R, 180, 8.109614456)
            Line((0, 1.410673598), (0, 0))
            Line((0, 0), (0.1, 0))
        make_face()
    extrude(amount=37.05336799, mode=Mode.SUBTRACT)
    with BuildSketch(Plane(origin=(28.526683995, -80, -100.1), x_dir=(0, 0, 1), z_dir=(-1, 0, 0))) as fillet4_piece_3:
        with BuildLine():
            CenterArc((10, 1.410673598), FILLET4_R, 180, 8.109614456)
            Line((0, 1.410673598), (0, 0))
            Line((0, 0), (0.1, 0))
        make_face()
    extrude(amount=57.072170841, mode=Mode.SUBTRACT)


solid = Compound([part.part, body_2.part])
